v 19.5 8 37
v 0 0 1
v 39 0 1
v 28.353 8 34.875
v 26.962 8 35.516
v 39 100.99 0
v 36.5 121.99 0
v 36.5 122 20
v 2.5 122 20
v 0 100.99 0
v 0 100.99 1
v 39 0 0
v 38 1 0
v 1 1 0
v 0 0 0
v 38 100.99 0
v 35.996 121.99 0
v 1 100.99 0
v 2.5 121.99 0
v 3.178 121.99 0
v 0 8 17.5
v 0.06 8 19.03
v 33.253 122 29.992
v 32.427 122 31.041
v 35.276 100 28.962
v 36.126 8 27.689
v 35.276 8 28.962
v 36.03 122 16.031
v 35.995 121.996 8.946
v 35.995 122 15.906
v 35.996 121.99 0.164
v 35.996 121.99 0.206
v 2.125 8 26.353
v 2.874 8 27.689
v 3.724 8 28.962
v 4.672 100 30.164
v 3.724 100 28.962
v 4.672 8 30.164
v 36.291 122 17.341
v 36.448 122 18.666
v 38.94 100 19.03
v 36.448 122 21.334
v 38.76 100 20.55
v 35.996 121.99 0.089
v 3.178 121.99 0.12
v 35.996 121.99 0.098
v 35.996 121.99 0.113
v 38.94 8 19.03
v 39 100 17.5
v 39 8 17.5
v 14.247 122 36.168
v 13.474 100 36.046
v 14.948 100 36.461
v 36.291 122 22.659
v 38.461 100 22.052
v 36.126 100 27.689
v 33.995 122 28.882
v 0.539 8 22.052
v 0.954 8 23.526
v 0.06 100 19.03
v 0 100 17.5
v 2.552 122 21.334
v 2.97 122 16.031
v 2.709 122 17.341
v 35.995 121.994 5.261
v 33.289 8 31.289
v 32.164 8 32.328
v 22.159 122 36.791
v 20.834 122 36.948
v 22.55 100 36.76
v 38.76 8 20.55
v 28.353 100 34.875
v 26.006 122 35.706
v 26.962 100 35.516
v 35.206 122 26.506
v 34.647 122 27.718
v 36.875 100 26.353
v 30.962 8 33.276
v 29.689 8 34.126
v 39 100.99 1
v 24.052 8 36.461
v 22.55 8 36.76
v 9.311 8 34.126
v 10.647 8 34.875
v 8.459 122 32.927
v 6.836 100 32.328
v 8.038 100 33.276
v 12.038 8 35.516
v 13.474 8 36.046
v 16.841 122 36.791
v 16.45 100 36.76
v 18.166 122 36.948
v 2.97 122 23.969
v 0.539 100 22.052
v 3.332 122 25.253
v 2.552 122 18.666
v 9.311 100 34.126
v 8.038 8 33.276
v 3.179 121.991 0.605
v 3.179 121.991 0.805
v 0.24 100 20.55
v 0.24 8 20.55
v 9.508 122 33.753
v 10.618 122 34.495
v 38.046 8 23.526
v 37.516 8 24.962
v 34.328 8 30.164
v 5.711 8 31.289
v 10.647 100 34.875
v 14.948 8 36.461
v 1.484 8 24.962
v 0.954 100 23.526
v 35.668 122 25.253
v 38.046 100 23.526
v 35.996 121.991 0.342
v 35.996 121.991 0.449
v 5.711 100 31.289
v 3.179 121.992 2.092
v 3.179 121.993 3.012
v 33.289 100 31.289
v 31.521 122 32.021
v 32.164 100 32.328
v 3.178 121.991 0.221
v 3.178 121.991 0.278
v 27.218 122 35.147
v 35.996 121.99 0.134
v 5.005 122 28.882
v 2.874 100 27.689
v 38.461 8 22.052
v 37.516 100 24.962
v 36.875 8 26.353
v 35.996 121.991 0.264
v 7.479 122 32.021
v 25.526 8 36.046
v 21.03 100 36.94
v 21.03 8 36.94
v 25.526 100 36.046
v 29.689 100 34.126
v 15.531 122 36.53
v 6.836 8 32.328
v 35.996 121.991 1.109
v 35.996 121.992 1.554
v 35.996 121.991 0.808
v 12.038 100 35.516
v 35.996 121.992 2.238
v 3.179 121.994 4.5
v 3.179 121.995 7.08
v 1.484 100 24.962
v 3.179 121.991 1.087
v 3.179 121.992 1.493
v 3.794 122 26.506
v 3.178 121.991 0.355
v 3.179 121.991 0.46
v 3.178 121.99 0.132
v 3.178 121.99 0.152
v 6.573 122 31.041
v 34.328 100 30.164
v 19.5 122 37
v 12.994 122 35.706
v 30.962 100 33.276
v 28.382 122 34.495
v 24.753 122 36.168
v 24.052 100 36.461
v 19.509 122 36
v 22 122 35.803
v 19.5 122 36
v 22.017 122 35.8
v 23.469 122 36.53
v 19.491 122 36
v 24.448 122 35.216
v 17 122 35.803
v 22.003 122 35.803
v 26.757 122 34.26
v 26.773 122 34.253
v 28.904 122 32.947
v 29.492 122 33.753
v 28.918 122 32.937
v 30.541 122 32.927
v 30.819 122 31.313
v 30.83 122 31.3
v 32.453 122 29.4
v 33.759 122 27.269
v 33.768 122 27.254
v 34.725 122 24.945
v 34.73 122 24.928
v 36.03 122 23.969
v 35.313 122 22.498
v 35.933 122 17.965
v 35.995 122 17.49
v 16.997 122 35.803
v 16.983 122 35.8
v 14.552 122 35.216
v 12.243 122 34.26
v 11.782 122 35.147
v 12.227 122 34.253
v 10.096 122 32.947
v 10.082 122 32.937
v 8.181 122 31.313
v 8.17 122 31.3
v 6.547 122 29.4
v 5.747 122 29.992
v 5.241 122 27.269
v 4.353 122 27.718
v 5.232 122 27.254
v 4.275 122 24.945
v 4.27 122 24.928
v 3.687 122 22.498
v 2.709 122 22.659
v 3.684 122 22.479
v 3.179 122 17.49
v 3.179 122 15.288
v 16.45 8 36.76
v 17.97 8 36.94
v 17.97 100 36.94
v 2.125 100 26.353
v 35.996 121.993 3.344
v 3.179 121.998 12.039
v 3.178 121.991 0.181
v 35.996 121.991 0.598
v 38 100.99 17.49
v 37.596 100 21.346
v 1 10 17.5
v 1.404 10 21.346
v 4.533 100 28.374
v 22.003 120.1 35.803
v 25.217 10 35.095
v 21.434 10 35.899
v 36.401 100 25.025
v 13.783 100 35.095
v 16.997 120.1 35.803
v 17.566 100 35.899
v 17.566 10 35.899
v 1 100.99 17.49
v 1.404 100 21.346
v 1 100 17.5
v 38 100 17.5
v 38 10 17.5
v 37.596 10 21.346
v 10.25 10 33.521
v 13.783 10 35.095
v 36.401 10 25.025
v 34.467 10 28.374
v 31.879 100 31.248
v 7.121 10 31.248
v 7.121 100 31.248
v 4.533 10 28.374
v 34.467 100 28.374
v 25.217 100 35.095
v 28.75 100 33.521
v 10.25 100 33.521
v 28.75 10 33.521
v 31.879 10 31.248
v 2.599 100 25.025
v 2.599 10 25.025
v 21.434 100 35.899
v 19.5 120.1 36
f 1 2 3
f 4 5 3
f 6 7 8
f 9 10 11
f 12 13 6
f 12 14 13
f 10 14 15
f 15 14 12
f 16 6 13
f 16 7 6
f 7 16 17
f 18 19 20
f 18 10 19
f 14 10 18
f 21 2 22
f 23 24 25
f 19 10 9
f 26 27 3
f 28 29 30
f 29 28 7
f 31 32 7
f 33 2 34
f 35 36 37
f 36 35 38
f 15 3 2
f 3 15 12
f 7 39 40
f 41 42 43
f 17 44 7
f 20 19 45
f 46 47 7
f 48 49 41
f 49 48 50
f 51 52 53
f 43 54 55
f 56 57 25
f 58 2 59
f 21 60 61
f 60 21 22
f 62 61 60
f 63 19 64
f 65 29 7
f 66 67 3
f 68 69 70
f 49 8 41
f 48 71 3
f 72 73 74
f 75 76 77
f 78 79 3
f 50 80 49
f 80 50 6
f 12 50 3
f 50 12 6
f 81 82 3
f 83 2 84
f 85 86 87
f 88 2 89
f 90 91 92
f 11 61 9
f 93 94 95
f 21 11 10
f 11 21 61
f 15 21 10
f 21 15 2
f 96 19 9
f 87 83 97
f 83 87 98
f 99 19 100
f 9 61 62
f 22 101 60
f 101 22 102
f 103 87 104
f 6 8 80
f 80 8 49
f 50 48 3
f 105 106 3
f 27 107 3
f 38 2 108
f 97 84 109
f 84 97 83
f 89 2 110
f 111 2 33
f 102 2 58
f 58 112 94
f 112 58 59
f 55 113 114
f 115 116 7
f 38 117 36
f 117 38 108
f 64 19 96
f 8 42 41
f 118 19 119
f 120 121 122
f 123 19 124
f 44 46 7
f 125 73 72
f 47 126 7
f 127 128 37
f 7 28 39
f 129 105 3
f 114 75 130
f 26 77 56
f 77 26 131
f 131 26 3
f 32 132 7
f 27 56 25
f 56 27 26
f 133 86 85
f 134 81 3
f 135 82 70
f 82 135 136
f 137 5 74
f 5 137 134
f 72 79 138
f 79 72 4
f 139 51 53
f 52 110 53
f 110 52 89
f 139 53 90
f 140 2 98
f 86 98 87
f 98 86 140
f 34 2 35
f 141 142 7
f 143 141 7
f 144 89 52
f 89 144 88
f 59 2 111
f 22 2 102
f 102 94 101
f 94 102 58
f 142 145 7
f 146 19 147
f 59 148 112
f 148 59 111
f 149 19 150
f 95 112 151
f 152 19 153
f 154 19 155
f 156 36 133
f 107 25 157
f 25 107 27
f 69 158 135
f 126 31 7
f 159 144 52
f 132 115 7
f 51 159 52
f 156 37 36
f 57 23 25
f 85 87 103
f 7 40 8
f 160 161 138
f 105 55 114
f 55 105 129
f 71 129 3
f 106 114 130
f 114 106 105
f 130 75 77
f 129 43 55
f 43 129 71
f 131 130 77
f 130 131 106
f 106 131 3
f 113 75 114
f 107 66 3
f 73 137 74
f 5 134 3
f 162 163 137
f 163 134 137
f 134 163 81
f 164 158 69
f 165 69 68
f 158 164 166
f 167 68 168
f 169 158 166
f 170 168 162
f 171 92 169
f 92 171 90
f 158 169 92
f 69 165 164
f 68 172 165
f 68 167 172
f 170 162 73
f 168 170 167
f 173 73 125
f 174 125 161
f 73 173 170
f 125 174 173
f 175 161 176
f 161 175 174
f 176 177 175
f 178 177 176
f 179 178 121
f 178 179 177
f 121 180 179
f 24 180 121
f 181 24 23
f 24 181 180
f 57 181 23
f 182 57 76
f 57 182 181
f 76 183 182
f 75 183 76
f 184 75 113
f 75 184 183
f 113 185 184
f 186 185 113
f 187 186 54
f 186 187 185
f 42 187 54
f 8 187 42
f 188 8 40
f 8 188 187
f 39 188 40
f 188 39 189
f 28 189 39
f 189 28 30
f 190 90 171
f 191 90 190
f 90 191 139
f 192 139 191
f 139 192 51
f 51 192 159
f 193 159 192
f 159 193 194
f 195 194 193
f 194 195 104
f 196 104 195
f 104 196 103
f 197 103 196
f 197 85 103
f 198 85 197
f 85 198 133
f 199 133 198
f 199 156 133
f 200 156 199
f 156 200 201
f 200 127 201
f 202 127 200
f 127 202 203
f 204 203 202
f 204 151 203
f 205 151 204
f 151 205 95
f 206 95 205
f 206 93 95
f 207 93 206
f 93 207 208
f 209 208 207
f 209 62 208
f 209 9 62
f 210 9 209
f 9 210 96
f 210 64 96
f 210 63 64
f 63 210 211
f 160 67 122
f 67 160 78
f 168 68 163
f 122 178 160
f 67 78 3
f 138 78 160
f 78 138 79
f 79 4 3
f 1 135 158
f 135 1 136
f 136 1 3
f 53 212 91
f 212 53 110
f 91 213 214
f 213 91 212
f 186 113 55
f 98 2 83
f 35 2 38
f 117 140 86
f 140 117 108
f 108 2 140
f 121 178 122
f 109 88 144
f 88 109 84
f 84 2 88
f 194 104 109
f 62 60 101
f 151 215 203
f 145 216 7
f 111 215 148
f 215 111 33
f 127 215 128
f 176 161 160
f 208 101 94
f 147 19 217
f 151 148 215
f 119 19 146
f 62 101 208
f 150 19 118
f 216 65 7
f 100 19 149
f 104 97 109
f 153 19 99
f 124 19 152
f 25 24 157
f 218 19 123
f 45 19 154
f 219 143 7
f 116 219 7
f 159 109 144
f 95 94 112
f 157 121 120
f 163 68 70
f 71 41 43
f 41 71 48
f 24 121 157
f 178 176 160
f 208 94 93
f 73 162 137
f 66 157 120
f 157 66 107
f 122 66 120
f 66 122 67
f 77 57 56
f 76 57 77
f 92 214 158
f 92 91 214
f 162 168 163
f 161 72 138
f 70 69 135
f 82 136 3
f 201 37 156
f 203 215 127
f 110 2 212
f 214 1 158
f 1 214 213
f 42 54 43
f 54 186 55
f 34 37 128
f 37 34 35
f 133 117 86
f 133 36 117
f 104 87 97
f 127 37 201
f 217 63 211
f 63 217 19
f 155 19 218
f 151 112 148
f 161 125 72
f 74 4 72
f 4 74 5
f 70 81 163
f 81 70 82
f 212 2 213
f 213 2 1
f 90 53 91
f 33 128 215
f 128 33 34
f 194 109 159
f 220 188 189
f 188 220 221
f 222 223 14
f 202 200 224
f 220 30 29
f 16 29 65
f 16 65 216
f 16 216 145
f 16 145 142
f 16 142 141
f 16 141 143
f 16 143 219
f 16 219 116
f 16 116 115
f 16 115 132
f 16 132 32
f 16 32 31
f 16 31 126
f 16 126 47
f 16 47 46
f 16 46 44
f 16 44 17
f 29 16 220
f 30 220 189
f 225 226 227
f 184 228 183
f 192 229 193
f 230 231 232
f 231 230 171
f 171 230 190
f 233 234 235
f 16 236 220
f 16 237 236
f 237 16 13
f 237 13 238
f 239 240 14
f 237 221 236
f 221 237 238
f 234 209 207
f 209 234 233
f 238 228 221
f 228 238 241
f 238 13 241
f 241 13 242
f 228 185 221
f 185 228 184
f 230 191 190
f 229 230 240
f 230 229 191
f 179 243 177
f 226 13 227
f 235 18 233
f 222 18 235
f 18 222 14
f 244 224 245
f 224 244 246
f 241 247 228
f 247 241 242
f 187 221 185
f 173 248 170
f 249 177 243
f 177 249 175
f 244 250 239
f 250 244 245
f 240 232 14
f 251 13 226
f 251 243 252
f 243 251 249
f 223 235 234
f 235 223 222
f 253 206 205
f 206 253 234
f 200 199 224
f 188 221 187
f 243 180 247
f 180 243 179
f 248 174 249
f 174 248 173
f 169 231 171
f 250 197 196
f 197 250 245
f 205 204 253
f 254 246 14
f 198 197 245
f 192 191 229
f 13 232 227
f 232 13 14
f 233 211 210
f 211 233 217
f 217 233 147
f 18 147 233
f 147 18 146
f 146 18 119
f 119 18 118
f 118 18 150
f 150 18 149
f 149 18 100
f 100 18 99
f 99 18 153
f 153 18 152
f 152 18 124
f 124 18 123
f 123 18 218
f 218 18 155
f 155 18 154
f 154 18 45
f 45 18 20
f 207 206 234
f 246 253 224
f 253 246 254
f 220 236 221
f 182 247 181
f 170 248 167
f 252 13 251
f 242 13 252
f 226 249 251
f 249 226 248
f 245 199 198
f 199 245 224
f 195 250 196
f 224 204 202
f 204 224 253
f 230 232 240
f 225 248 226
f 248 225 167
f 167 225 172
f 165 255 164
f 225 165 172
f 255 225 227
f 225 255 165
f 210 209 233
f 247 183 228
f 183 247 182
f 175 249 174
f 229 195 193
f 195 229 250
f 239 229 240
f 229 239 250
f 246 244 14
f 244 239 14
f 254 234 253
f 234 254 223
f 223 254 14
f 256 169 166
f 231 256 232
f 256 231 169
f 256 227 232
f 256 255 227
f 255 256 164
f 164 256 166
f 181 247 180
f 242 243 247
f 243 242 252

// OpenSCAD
difference() {
  hull() {
    cube([39,100,1]);
    // taper base
    translate([0,100-0.01,0]) hull() {
      cube([39,1,1]);
      translate([5/2,22-1,0]) cube([34,1,1]);
    }
    
    // round top
    intersection() {
      cube([39,122,39]);
      union() {
        translate([39/2,100,37-39/2]) rotate([90,0,0])
          cylinder(d=39, h=92, $fn=80);
        translate([34/2+5/2,122,37-34/2]) rotate([90,0,0])
          cylinder(d=34, h=22, $fn=80);
      }
    }

  }
  // notches on side
  //translate([-0.01,80,-0.01]) cube([39.02,24,1.1]);
  
  hull() {
    translate([39/2,100,37-39/2]) rotate([90,0,0])
      cylinder(d=37, h=90);
    translate([34/2+5/2,122.1,37-34/2]) rotate([90,0,0])
      cylinder(d=32, h=2, $fn=40);
    
    // leave the front end open for the taper
    translate([1,1,-0.01]) hull() {
      translate([0,10,37-39/2]) cube([37,89,0.01]);
      cube([37,99,0.01]);

    }
    
    // taper base cutout
    translate([1,100-0.01,-0.01]) hull() {
      cube([37,1,37-39/2]);
      translate([5/2,24.1,0]) cube([32.2,1,37-39/2]);
    }
  }
  
}
